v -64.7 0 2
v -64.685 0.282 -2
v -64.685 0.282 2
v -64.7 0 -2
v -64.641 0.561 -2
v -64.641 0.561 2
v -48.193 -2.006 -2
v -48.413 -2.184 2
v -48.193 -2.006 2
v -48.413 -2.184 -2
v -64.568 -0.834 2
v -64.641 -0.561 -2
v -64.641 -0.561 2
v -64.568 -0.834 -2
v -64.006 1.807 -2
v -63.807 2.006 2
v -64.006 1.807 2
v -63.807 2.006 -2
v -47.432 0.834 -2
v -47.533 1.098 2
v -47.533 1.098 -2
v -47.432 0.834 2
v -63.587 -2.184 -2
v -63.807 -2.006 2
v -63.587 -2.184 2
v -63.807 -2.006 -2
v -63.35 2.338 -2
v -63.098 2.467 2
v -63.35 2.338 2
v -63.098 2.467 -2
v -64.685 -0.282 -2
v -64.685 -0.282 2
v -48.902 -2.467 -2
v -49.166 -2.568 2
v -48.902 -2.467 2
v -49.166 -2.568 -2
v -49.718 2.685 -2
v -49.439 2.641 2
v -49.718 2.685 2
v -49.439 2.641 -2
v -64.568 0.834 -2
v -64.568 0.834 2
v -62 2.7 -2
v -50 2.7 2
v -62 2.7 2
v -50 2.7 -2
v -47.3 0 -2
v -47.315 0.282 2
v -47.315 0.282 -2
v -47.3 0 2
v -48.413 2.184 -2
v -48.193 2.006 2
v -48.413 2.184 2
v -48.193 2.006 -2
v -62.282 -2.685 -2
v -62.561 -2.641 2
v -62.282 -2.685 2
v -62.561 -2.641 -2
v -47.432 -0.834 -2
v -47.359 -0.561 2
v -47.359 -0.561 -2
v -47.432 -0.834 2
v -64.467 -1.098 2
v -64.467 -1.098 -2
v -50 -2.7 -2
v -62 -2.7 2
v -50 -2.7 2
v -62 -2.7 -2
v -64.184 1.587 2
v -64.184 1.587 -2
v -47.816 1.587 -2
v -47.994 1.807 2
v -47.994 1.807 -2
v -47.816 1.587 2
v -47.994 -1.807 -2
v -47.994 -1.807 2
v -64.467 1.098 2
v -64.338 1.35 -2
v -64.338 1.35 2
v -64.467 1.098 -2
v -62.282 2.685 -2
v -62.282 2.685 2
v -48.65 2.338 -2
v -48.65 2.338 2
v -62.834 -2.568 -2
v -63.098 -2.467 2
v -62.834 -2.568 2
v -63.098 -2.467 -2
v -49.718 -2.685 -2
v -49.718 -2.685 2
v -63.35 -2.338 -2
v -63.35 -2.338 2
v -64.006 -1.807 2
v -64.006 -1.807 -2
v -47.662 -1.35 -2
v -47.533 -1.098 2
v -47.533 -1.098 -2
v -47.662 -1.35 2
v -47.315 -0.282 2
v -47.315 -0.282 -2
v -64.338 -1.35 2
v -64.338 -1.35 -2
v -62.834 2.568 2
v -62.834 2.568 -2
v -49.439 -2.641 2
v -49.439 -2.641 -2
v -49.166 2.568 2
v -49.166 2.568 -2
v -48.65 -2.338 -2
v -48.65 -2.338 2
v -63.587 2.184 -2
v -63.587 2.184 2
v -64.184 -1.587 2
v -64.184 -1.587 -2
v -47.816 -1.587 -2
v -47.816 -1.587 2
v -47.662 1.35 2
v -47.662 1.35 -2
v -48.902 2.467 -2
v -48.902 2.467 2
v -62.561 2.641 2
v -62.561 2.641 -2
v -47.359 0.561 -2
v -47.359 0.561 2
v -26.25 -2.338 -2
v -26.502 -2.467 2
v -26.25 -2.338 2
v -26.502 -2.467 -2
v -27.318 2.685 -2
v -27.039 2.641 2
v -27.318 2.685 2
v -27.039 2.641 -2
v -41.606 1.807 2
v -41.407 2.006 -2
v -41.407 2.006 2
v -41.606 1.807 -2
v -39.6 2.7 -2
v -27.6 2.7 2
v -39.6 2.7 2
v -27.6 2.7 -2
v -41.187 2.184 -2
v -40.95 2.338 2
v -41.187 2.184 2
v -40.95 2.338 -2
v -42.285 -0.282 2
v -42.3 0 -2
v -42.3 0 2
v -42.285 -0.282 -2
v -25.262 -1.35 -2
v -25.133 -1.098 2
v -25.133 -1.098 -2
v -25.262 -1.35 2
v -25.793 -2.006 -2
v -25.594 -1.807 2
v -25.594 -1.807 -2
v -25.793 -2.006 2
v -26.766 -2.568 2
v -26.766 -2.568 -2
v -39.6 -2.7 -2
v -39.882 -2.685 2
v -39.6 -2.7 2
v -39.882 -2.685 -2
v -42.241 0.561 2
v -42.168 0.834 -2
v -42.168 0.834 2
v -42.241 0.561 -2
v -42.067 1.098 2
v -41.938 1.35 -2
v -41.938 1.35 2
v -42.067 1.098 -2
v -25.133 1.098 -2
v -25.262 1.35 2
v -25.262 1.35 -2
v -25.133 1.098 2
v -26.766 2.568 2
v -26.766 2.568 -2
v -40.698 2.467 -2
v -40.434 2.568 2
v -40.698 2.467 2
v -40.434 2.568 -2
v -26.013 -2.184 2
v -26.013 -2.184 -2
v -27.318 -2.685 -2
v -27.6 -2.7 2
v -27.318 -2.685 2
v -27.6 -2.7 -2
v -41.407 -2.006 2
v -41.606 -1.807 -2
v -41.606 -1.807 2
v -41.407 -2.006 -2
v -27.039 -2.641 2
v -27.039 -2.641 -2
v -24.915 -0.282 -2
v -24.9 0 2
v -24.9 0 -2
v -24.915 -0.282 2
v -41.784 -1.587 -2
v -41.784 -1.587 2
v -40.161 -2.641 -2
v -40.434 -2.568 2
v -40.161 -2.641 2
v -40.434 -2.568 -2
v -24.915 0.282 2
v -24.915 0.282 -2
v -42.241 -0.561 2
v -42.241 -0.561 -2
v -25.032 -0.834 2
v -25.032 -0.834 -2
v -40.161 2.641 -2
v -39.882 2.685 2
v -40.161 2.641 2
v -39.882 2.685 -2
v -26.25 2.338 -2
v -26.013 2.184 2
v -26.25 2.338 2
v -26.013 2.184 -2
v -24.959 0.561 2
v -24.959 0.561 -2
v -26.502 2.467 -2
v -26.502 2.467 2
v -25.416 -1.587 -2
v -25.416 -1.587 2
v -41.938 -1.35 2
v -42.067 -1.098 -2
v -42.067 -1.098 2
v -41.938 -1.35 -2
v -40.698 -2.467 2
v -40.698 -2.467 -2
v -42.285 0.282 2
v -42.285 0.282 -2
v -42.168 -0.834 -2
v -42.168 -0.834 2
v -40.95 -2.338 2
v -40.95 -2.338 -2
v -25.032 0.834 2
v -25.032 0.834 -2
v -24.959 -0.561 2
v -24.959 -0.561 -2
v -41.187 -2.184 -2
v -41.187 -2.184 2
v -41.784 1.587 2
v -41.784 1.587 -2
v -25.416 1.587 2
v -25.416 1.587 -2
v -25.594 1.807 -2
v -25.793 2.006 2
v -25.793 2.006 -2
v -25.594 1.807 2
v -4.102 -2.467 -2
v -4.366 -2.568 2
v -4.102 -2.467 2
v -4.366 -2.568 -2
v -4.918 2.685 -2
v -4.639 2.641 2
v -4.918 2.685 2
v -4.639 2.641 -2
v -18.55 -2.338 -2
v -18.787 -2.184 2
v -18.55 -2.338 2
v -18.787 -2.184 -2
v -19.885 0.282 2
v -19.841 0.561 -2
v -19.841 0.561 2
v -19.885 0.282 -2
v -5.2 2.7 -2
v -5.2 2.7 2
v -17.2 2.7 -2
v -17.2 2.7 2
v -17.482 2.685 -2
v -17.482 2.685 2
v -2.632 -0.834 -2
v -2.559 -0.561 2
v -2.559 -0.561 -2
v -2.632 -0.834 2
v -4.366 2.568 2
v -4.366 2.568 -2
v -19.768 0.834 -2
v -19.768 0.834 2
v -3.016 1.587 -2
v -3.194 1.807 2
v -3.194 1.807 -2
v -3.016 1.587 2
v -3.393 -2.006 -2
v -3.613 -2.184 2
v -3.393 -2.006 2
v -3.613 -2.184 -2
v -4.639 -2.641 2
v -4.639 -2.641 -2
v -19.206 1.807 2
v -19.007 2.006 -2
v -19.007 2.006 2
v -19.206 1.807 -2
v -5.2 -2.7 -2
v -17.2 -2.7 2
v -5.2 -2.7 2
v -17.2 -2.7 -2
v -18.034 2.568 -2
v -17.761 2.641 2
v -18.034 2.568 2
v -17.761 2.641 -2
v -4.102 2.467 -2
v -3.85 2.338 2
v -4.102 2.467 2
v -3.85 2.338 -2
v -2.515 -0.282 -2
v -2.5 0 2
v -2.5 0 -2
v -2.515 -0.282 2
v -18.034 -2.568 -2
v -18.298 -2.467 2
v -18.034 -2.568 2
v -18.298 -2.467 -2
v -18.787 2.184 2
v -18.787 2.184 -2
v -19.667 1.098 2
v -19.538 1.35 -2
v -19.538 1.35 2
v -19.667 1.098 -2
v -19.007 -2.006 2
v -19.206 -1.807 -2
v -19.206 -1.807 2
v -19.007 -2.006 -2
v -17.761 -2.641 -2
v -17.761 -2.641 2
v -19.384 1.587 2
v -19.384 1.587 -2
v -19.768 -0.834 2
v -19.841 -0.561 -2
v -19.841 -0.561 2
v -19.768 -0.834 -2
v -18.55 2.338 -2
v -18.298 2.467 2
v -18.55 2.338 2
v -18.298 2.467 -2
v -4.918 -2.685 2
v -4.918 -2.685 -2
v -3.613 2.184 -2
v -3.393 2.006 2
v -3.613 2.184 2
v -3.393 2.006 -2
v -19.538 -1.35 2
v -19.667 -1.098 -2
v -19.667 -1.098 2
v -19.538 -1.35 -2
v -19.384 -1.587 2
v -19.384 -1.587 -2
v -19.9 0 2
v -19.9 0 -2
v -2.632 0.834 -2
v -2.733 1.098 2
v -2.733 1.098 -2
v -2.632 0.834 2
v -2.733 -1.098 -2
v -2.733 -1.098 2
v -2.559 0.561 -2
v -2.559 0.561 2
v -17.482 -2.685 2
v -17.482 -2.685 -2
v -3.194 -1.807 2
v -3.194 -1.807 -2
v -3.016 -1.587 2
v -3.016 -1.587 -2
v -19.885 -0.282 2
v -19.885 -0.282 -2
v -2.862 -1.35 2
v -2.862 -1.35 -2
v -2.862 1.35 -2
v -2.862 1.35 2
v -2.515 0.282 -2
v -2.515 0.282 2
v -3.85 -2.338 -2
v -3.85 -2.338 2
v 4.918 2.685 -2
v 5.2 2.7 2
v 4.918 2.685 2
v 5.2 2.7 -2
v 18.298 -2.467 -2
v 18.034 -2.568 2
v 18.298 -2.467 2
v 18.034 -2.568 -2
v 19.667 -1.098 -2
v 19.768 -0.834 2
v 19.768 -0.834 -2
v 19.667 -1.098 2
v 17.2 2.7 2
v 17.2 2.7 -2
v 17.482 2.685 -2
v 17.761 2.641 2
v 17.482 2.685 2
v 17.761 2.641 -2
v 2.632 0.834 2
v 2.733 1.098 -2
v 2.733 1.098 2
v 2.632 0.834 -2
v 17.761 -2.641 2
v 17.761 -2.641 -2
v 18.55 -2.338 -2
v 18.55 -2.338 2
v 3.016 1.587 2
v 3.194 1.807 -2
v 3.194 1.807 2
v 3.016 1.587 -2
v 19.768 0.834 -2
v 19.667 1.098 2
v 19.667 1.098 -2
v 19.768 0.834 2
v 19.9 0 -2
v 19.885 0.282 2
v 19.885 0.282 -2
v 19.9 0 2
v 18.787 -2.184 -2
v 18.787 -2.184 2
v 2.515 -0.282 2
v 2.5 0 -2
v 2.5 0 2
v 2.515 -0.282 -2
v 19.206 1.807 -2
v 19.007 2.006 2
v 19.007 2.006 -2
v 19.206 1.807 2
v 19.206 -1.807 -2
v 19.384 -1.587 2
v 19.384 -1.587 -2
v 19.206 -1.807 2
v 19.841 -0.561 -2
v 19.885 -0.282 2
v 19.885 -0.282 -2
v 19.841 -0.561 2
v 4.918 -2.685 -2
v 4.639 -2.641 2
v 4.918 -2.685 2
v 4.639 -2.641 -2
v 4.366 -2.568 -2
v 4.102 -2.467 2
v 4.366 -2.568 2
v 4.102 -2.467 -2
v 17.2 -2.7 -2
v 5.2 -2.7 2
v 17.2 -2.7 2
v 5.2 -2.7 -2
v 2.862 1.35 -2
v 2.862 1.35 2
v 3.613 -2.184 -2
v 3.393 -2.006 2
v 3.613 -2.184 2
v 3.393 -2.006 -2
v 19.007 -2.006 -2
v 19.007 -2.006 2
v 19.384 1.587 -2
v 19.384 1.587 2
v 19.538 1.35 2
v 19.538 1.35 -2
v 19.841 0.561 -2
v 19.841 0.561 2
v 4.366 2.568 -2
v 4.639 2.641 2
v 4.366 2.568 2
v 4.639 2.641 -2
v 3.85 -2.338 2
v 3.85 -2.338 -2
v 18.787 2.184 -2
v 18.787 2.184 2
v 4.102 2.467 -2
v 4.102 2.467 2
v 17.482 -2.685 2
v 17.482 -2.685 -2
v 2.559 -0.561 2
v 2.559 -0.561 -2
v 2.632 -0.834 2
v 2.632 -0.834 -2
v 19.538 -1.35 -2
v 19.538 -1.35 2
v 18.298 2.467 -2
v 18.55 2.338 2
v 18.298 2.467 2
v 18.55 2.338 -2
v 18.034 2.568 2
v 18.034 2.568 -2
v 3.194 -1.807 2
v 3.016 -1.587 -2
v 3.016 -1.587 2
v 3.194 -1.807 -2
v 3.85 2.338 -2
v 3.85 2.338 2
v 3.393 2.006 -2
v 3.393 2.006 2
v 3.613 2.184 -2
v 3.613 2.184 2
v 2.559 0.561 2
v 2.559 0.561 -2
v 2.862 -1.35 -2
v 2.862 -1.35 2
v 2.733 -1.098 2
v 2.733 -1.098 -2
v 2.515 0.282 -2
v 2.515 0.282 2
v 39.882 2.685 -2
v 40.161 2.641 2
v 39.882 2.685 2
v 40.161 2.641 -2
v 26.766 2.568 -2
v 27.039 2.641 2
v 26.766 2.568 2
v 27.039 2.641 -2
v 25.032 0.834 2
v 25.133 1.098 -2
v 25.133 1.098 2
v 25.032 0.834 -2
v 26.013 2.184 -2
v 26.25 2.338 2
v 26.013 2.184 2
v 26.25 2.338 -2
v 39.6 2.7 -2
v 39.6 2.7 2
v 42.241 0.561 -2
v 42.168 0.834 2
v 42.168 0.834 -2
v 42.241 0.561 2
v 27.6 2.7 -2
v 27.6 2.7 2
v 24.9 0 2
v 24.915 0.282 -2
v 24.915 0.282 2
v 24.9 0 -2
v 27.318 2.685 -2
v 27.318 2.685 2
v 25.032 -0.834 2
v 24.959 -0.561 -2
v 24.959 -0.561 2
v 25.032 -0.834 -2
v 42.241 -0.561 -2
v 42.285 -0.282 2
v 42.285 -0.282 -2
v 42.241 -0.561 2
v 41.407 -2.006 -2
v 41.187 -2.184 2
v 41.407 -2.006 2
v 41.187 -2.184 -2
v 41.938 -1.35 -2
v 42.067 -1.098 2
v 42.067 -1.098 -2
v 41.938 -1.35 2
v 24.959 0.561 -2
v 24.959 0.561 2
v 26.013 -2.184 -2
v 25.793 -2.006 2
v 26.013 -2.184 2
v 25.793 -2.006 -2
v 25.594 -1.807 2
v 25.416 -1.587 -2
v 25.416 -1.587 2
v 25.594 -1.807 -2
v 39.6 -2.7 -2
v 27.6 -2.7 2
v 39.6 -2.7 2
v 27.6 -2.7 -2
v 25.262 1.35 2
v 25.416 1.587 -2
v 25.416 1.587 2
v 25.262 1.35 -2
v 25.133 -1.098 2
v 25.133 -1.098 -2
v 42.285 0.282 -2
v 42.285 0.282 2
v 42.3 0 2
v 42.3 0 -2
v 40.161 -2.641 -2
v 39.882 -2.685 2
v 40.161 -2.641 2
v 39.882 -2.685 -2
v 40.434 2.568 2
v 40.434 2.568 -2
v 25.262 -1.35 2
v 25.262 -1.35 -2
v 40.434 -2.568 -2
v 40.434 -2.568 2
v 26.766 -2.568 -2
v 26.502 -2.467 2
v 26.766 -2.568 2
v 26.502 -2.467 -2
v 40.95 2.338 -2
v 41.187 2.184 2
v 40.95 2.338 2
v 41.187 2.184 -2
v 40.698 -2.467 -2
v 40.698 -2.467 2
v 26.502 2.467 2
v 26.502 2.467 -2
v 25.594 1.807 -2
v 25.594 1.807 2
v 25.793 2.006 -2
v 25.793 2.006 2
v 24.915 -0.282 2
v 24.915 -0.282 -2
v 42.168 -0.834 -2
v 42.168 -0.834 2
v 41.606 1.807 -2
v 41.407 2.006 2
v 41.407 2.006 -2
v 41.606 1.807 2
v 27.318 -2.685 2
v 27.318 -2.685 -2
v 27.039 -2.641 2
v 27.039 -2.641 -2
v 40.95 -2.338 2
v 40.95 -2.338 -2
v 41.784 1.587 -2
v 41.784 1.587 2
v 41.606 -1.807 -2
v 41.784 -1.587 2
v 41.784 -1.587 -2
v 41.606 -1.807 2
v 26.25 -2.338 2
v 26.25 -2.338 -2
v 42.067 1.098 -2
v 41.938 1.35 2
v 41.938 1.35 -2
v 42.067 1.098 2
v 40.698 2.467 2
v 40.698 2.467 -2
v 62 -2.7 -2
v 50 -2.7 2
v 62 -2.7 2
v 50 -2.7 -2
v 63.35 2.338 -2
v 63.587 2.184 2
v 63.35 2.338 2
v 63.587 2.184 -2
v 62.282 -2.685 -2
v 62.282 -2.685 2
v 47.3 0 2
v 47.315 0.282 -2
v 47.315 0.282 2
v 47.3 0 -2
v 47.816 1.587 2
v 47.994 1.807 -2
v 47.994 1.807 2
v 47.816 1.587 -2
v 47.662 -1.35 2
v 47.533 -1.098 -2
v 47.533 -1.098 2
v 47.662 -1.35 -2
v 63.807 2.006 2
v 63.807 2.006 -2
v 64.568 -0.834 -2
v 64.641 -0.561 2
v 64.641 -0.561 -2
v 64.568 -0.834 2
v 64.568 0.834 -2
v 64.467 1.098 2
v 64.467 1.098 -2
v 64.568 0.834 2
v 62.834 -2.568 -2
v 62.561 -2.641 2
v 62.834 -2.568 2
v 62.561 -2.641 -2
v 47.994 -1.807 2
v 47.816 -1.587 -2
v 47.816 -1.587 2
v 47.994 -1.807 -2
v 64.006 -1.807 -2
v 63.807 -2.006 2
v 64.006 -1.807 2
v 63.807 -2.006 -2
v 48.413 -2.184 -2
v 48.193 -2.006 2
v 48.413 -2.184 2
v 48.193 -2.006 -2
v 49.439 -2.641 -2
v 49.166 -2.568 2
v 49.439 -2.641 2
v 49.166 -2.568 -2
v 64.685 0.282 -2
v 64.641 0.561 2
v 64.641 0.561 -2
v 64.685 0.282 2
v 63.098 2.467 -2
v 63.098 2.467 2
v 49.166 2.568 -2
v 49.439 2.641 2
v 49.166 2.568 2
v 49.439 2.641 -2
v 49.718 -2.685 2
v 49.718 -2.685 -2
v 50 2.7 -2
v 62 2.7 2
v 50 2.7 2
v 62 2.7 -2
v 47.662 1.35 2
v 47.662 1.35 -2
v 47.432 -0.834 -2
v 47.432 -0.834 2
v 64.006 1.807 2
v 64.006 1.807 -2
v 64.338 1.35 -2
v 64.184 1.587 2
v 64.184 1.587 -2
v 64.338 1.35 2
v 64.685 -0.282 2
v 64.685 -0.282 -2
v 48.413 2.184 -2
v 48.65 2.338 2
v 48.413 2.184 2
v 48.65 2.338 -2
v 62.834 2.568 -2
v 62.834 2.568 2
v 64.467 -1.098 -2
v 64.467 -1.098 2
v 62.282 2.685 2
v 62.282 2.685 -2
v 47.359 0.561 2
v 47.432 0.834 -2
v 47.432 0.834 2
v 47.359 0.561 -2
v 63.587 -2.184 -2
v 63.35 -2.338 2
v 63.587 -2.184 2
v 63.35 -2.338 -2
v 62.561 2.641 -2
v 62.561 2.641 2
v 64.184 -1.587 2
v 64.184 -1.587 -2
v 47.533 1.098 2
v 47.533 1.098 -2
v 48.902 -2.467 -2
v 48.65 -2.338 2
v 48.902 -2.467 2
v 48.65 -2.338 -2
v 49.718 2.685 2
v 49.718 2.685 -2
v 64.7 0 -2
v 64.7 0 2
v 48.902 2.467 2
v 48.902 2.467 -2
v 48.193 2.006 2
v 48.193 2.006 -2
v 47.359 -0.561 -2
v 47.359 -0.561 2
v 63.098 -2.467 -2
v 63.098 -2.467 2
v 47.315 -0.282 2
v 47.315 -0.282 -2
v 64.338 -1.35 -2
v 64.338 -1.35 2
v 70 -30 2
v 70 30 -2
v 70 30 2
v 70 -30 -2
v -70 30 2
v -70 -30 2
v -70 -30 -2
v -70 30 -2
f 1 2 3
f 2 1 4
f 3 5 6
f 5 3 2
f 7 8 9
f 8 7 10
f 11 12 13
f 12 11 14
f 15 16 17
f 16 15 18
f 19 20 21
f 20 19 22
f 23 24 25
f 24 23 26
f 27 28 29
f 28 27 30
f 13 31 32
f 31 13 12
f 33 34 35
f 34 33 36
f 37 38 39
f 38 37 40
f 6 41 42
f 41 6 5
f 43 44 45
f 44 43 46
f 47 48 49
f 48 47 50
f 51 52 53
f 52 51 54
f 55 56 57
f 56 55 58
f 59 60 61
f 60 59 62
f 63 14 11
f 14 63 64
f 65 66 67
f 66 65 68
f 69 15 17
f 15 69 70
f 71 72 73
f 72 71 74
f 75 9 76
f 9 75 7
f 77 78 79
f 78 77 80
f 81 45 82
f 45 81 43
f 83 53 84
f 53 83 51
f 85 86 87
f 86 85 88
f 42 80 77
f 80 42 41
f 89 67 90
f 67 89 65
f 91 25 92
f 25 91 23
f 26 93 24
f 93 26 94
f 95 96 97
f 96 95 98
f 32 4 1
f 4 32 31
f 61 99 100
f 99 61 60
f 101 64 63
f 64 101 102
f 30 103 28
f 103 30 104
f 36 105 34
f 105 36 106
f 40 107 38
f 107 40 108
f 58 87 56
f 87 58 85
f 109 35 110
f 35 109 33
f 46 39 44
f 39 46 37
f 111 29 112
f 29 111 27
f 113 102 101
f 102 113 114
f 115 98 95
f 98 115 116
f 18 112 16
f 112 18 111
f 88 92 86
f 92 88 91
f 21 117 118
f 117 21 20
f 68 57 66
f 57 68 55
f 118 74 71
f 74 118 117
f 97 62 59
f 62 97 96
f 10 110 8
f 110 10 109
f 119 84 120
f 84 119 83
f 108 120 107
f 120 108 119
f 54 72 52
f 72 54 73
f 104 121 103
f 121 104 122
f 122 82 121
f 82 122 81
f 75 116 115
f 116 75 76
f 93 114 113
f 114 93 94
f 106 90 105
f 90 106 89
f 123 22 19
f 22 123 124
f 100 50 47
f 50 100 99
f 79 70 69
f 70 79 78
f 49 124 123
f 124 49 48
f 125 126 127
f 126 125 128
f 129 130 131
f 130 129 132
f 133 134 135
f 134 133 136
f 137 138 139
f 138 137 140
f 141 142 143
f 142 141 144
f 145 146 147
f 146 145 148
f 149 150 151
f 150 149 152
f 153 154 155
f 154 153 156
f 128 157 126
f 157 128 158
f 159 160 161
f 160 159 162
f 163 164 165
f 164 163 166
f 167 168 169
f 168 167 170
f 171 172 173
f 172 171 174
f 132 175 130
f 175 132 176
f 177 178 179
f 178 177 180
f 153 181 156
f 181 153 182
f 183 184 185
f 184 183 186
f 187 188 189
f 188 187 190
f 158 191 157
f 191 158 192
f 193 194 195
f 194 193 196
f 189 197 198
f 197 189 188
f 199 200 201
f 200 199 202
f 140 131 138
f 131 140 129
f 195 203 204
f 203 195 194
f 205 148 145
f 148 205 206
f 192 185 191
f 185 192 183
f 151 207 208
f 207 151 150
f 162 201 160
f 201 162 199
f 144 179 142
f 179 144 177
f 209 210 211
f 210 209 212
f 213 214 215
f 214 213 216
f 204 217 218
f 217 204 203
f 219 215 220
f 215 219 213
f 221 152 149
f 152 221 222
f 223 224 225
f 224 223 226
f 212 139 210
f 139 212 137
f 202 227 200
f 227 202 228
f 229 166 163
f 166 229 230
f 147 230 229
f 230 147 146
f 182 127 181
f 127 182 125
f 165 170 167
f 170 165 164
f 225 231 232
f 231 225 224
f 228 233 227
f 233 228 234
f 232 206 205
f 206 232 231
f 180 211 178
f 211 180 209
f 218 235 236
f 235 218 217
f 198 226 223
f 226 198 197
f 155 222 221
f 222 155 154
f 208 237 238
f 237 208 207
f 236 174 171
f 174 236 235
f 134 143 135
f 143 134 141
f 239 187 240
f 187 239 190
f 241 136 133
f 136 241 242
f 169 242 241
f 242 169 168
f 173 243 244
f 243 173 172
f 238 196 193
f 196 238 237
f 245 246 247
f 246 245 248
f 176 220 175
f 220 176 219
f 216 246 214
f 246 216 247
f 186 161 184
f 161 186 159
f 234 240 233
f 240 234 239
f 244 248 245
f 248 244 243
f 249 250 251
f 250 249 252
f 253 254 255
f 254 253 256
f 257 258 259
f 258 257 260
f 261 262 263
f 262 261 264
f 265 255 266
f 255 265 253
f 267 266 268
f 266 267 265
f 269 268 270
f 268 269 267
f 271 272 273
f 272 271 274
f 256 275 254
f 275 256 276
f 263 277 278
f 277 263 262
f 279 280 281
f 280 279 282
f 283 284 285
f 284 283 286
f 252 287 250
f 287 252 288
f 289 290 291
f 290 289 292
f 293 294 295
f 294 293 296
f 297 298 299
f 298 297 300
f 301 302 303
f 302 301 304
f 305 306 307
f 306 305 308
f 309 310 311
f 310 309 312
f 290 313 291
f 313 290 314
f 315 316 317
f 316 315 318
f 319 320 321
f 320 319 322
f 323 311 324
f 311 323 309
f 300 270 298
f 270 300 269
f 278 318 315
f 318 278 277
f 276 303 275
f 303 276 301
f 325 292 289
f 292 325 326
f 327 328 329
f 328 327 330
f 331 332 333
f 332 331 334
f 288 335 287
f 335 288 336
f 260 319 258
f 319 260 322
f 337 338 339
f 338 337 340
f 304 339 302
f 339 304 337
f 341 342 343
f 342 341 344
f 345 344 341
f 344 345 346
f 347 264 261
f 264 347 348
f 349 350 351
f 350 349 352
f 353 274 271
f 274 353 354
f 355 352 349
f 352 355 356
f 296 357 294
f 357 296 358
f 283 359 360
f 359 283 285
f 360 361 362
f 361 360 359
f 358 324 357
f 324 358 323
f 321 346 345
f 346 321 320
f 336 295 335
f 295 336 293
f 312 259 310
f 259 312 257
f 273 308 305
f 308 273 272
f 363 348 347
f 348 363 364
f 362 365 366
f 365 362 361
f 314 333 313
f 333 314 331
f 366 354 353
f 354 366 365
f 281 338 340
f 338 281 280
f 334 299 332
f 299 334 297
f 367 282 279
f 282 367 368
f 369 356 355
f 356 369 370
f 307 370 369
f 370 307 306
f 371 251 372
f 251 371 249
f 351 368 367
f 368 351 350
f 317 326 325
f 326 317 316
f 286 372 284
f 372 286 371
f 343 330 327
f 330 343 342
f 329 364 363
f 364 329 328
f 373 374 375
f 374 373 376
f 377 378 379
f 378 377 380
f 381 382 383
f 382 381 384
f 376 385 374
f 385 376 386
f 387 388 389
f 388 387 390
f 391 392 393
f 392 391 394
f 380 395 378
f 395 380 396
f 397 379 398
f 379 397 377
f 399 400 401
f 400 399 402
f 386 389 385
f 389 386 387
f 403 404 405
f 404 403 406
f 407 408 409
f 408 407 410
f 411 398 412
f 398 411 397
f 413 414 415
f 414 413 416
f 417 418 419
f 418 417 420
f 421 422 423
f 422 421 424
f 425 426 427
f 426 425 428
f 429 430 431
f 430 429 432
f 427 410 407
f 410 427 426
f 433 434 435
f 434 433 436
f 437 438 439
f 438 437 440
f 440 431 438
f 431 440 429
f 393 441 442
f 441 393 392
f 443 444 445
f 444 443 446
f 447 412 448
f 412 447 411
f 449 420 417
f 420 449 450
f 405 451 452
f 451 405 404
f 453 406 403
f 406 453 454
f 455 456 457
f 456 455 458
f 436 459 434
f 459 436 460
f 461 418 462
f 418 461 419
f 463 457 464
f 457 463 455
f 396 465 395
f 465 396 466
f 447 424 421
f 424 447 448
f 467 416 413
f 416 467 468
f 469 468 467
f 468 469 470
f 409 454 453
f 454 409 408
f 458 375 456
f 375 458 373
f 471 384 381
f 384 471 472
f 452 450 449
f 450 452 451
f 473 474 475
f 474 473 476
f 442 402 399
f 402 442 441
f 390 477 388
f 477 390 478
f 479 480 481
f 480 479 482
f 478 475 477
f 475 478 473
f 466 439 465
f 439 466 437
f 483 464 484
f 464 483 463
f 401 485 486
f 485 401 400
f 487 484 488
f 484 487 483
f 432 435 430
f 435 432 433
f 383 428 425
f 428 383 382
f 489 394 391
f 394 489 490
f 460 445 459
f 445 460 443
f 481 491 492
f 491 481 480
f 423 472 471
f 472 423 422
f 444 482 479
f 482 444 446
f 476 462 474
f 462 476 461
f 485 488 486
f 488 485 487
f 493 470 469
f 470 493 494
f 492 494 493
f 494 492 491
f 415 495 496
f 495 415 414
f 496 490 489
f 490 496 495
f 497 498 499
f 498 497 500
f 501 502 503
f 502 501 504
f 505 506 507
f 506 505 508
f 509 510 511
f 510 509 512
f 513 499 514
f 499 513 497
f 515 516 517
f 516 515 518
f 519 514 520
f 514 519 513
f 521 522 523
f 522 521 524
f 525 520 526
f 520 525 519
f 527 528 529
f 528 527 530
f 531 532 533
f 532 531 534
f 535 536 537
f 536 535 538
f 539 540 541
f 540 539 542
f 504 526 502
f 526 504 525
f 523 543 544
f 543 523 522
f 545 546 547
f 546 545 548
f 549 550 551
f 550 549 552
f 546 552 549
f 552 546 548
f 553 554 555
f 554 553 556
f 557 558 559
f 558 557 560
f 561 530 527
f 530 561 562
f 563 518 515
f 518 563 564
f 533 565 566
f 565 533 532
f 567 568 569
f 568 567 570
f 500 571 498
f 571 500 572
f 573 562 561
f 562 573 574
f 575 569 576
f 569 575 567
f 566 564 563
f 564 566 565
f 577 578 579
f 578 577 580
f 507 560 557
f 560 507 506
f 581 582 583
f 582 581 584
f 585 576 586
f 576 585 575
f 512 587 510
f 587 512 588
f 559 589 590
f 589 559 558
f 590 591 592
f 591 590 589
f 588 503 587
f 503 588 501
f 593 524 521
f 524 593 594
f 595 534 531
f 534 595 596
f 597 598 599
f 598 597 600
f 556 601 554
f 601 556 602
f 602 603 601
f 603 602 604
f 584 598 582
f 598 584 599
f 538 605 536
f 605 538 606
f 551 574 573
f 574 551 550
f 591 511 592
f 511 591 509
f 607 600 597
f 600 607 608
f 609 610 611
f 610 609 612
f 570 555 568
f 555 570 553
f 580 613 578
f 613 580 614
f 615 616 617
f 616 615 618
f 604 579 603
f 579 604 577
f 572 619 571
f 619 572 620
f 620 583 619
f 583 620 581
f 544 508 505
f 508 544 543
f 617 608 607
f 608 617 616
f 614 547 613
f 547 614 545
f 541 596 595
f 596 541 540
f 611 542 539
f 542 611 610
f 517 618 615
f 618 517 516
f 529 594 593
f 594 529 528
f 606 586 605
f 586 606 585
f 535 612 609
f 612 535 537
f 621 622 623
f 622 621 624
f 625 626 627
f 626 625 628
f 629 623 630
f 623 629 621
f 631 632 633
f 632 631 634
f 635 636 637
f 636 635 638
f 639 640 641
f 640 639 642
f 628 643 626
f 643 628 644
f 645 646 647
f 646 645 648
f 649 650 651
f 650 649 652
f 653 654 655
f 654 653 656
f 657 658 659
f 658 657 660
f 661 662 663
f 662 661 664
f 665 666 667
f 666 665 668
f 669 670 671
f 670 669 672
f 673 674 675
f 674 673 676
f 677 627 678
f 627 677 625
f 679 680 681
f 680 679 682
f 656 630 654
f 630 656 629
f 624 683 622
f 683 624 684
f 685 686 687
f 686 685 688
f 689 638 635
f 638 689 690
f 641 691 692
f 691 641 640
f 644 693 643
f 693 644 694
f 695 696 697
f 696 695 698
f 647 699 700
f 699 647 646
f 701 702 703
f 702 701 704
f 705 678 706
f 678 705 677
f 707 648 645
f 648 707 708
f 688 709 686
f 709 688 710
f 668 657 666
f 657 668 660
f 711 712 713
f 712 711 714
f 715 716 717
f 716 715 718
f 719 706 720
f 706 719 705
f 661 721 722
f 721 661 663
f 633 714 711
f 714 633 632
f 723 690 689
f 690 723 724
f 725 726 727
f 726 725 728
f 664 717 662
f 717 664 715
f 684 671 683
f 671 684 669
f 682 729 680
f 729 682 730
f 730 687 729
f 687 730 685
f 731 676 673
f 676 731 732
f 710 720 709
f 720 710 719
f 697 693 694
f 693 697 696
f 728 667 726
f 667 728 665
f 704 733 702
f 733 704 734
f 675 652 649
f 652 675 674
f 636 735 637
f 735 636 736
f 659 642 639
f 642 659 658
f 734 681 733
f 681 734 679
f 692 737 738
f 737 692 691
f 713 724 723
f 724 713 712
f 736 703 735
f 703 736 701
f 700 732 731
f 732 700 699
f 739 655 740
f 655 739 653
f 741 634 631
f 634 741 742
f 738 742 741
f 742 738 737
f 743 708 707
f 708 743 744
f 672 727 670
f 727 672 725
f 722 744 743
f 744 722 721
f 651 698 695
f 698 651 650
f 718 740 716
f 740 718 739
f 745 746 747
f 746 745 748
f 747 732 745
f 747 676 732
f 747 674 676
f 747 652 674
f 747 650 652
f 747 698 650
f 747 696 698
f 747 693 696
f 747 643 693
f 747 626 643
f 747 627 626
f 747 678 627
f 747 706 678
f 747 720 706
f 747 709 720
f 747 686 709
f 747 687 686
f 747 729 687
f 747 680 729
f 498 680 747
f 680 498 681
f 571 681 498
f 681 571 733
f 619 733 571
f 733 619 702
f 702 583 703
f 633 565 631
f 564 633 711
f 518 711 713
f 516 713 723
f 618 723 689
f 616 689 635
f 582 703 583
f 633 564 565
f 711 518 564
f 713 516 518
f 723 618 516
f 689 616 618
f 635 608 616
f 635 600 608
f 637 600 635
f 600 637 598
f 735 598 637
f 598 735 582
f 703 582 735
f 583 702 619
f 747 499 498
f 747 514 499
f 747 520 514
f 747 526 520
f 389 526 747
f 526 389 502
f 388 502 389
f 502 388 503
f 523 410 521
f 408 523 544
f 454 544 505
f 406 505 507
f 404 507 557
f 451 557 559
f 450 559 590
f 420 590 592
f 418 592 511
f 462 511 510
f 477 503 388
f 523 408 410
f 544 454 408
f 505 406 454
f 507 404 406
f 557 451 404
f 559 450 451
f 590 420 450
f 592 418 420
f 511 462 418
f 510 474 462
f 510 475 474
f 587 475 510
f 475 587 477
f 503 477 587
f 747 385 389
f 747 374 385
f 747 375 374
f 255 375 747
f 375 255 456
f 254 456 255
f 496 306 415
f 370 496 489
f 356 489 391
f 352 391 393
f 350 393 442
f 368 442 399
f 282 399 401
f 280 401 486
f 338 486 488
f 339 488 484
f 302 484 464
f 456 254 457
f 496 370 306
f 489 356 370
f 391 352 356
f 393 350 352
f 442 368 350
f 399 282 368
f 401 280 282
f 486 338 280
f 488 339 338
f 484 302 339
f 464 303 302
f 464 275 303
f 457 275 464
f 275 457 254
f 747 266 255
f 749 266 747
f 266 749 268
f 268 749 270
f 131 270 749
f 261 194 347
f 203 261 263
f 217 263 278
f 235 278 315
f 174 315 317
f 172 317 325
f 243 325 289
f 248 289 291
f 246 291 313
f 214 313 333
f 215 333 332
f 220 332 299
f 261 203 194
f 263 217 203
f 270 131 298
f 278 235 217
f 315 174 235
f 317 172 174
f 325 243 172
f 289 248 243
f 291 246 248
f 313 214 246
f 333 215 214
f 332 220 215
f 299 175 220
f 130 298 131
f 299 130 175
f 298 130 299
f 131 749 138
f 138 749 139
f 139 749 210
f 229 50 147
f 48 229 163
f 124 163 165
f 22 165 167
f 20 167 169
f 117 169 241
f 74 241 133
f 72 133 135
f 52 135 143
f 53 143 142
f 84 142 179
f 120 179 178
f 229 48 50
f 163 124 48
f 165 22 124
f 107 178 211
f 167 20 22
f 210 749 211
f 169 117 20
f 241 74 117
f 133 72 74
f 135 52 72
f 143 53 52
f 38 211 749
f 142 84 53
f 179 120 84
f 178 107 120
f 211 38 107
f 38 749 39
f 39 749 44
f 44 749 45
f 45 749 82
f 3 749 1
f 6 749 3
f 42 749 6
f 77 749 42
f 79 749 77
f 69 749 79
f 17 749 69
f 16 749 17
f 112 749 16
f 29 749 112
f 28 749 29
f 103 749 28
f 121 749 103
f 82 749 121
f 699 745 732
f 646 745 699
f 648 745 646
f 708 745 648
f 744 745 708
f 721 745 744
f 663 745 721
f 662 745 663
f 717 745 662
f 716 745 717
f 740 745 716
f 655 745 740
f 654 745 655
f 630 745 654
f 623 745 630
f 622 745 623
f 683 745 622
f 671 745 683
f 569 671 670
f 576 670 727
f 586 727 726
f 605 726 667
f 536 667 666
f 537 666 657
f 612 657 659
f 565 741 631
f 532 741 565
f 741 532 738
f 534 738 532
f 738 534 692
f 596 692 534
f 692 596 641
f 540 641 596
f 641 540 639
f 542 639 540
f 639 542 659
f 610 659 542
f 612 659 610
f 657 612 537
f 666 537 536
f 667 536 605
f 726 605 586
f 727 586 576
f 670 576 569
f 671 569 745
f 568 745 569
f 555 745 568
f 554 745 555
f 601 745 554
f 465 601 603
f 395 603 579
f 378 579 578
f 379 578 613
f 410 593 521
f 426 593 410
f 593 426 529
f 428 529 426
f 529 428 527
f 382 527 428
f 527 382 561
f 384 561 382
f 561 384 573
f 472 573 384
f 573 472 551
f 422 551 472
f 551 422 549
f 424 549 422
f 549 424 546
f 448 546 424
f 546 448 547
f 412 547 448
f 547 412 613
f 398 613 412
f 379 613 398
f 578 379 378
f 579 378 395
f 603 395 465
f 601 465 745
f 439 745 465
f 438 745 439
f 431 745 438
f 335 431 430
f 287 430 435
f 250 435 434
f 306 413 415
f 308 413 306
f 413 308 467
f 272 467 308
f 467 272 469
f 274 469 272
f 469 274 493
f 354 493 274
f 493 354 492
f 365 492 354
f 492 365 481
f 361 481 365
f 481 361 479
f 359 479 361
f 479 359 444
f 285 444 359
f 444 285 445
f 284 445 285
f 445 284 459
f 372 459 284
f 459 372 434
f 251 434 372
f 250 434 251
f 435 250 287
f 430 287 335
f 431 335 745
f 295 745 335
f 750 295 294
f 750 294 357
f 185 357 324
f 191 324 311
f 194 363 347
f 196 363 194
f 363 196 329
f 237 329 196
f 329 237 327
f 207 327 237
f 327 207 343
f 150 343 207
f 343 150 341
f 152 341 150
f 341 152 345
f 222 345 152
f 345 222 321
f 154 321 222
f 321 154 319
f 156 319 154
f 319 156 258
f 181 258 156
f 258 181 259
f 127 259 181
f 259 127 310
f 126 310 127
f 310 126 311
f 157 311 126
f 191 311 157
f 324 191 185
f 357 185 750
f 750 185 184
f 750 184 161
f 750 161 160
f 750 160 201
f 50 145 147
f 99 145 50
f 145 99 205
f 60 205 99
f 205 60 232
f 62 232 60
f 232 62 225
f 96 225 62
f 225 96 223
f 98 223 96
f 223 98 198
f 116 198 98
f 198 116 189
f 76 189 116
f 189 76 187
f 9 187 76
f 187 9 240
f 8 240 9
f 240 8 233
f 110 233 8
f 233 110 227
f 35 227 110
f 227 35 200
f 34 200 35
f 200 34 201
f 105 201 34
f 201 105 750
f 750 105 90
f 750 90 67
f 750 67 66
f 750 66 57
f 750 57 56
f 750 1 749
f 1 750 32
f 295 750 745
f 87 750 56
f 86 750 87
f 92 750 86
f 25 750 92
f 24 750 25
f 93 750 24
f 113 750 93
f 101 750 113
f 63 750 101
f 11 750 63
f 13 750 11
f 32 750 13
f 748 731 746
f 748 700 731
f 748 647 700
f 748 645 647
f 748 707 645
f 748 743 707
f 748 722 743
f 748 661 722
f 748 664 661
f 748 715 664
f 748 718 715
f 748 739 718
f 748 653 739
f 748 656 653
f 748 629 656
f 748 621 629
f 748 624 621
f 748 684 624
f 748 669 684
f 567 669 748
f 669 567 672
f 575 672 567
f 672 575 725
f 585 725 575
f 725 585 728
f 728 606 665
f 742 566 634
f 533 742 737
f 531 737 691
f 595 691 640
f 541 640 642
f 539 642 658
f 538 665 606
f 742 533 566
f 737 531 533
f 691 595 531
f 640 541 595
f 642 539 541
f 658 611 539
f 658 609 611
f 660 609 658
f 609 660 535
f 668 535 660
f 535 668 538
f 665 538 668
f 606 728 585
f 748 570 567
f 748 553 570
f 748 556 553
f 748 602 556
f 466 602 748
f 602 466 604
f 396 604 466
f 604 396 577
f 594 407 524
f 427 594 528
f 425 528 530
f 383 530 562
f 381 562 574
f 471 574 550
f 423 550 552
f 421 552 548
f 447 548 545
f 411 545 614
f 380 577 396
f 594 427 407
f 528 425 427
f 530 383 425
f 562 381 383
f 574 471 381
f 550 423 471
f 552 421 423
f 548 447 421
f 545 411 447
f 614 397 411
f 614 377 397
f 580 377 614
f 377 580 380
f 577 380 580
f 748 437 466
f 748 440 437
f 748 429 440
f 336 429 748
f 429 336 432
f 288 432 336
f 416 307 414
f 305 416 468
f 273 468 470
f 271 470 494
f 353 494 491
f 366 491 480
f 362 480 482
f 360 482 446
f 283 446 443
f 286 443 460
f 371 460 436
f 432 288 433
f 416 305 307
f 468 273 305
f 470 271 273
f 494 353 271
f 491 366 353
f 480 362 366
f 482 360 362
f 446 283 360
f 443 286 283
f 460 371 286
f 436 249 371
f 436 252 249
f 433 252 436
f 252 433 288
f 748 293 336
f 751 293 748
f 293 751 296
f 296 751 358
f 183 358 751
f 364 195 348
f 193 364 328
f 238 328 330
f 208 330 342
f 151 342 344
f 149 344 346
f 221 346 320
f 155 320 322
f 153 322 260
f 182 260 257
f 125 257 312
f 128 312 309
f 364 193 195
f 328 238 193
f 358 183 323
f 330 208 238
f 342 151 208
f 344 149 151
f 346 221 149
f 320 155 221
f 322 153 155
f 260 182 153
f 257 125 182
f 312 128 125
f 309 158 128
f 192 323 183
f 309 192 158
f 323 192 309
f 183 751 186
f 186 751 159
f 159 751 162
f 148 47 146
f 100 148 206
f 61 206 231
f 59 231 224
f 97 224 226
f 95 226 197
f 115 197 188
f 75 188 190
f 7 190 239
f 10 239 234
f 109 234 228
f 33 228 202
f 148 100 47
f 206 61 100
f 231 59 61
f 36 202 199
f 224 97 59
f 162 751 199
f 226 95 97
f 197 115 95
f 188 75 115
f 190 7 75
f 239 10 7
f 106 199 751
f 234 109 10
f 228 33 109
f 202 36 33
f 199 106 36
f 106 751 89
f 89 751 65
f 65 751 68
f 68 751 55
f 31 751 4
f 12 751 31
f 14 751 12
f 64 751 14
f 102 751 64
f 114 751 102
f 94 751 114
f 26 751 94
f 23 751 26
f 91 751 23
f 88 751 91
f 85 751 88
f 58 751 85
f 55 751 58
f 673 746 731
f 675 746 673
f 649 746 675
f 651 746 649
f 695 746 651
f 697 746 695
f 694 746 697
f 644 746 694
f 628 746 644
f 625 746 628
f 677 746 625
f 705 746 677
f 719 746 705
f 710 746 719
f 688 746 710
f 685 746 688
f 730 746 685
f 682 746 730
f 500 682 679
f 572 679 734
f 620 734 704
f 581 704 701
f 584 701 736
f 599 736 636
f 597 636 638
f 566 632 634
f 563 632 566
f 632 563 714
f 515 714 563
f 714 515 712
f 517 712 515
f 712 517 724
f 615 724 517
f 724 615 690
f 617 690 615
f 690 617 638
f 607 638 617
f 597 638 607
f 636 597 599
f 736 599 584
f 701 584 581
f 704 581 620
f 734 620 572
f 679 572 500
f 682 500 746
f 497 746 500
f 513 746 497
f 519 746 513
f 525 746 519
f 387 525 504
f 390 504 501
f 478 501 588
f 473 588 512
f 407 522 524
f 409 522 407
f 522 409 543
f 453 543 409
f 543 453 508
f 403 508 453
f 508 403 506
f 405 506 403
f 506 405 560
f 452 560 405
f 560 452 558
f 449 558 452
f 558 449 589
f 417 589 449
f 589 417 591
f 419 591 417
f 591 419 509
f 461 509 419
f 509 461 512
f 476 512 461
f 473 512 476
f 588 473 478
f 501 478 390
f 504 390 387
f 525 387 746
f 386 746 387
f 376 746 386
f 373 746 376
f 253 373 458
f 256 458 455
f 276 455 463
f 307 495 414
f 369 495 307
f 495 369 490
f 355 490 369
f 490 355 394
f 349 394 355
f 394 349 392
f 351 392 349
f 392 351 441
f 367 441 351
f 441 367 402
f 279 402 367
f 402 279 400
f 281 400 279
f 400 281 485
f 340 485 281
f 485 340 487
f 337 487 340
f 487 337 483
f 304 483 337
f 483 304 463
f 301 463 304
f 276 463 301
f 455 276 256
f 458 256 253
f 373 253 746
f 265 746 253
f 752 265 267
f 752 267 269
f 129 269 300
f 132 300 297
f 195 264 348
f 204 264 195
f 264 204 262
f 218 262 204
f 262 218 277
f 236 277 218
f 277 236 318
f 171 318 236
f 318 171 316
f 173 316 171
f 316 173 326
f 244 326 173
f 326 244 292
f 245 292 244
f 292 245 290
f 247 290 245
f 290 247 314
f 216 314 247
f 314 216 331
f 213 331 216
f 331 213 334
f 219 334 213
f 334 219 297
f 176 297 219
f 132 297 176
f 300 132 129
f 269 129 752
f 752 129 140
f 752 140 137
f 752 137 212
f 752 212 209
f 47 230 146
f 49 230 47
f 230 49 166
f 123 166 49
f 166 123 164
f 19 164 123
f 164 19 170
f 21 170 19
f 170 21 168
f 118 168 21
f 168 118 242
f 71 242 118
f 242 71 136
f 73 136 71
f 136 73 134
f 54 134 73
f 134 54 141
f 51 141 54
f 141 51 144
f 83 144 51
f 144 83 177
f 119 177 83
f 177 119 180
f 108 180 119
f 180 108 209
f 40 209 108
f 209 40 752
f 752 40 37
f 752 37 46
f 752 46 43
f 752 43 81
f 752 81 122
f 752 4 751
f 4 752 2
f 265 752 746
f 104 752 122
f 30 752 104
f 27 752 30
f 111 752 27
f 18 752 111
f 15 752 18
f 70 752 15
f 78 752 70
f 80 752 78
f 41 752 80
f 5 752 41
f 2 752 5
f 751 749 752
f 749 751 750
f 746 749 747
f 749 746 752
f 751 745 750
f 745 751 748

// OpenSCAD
// Slotted mounting plate.
$fn = 60;
eps = 0.02;
plate_l = 140;
plate_w = 60;
plate_t = 4;
slot_l = 12;
slot_d = 5.4;
module slot(x) { hull() { translate([x-slot_l/2,0,-plate_t/2-eps]) cylinder(d=slot_d,h=plate_t+2*eps); translate([x+slot_l/2,0,-plate_t/2-eps]) cylinder(d=slot_d,h=plate_t+2*eps); } }
difference() { cube([plate_l, plate_w, plate_t], center=true); for (i=[0:5]) slot(-plate_l/2+14+i*(plate_l-28)/max(1,5)); }
